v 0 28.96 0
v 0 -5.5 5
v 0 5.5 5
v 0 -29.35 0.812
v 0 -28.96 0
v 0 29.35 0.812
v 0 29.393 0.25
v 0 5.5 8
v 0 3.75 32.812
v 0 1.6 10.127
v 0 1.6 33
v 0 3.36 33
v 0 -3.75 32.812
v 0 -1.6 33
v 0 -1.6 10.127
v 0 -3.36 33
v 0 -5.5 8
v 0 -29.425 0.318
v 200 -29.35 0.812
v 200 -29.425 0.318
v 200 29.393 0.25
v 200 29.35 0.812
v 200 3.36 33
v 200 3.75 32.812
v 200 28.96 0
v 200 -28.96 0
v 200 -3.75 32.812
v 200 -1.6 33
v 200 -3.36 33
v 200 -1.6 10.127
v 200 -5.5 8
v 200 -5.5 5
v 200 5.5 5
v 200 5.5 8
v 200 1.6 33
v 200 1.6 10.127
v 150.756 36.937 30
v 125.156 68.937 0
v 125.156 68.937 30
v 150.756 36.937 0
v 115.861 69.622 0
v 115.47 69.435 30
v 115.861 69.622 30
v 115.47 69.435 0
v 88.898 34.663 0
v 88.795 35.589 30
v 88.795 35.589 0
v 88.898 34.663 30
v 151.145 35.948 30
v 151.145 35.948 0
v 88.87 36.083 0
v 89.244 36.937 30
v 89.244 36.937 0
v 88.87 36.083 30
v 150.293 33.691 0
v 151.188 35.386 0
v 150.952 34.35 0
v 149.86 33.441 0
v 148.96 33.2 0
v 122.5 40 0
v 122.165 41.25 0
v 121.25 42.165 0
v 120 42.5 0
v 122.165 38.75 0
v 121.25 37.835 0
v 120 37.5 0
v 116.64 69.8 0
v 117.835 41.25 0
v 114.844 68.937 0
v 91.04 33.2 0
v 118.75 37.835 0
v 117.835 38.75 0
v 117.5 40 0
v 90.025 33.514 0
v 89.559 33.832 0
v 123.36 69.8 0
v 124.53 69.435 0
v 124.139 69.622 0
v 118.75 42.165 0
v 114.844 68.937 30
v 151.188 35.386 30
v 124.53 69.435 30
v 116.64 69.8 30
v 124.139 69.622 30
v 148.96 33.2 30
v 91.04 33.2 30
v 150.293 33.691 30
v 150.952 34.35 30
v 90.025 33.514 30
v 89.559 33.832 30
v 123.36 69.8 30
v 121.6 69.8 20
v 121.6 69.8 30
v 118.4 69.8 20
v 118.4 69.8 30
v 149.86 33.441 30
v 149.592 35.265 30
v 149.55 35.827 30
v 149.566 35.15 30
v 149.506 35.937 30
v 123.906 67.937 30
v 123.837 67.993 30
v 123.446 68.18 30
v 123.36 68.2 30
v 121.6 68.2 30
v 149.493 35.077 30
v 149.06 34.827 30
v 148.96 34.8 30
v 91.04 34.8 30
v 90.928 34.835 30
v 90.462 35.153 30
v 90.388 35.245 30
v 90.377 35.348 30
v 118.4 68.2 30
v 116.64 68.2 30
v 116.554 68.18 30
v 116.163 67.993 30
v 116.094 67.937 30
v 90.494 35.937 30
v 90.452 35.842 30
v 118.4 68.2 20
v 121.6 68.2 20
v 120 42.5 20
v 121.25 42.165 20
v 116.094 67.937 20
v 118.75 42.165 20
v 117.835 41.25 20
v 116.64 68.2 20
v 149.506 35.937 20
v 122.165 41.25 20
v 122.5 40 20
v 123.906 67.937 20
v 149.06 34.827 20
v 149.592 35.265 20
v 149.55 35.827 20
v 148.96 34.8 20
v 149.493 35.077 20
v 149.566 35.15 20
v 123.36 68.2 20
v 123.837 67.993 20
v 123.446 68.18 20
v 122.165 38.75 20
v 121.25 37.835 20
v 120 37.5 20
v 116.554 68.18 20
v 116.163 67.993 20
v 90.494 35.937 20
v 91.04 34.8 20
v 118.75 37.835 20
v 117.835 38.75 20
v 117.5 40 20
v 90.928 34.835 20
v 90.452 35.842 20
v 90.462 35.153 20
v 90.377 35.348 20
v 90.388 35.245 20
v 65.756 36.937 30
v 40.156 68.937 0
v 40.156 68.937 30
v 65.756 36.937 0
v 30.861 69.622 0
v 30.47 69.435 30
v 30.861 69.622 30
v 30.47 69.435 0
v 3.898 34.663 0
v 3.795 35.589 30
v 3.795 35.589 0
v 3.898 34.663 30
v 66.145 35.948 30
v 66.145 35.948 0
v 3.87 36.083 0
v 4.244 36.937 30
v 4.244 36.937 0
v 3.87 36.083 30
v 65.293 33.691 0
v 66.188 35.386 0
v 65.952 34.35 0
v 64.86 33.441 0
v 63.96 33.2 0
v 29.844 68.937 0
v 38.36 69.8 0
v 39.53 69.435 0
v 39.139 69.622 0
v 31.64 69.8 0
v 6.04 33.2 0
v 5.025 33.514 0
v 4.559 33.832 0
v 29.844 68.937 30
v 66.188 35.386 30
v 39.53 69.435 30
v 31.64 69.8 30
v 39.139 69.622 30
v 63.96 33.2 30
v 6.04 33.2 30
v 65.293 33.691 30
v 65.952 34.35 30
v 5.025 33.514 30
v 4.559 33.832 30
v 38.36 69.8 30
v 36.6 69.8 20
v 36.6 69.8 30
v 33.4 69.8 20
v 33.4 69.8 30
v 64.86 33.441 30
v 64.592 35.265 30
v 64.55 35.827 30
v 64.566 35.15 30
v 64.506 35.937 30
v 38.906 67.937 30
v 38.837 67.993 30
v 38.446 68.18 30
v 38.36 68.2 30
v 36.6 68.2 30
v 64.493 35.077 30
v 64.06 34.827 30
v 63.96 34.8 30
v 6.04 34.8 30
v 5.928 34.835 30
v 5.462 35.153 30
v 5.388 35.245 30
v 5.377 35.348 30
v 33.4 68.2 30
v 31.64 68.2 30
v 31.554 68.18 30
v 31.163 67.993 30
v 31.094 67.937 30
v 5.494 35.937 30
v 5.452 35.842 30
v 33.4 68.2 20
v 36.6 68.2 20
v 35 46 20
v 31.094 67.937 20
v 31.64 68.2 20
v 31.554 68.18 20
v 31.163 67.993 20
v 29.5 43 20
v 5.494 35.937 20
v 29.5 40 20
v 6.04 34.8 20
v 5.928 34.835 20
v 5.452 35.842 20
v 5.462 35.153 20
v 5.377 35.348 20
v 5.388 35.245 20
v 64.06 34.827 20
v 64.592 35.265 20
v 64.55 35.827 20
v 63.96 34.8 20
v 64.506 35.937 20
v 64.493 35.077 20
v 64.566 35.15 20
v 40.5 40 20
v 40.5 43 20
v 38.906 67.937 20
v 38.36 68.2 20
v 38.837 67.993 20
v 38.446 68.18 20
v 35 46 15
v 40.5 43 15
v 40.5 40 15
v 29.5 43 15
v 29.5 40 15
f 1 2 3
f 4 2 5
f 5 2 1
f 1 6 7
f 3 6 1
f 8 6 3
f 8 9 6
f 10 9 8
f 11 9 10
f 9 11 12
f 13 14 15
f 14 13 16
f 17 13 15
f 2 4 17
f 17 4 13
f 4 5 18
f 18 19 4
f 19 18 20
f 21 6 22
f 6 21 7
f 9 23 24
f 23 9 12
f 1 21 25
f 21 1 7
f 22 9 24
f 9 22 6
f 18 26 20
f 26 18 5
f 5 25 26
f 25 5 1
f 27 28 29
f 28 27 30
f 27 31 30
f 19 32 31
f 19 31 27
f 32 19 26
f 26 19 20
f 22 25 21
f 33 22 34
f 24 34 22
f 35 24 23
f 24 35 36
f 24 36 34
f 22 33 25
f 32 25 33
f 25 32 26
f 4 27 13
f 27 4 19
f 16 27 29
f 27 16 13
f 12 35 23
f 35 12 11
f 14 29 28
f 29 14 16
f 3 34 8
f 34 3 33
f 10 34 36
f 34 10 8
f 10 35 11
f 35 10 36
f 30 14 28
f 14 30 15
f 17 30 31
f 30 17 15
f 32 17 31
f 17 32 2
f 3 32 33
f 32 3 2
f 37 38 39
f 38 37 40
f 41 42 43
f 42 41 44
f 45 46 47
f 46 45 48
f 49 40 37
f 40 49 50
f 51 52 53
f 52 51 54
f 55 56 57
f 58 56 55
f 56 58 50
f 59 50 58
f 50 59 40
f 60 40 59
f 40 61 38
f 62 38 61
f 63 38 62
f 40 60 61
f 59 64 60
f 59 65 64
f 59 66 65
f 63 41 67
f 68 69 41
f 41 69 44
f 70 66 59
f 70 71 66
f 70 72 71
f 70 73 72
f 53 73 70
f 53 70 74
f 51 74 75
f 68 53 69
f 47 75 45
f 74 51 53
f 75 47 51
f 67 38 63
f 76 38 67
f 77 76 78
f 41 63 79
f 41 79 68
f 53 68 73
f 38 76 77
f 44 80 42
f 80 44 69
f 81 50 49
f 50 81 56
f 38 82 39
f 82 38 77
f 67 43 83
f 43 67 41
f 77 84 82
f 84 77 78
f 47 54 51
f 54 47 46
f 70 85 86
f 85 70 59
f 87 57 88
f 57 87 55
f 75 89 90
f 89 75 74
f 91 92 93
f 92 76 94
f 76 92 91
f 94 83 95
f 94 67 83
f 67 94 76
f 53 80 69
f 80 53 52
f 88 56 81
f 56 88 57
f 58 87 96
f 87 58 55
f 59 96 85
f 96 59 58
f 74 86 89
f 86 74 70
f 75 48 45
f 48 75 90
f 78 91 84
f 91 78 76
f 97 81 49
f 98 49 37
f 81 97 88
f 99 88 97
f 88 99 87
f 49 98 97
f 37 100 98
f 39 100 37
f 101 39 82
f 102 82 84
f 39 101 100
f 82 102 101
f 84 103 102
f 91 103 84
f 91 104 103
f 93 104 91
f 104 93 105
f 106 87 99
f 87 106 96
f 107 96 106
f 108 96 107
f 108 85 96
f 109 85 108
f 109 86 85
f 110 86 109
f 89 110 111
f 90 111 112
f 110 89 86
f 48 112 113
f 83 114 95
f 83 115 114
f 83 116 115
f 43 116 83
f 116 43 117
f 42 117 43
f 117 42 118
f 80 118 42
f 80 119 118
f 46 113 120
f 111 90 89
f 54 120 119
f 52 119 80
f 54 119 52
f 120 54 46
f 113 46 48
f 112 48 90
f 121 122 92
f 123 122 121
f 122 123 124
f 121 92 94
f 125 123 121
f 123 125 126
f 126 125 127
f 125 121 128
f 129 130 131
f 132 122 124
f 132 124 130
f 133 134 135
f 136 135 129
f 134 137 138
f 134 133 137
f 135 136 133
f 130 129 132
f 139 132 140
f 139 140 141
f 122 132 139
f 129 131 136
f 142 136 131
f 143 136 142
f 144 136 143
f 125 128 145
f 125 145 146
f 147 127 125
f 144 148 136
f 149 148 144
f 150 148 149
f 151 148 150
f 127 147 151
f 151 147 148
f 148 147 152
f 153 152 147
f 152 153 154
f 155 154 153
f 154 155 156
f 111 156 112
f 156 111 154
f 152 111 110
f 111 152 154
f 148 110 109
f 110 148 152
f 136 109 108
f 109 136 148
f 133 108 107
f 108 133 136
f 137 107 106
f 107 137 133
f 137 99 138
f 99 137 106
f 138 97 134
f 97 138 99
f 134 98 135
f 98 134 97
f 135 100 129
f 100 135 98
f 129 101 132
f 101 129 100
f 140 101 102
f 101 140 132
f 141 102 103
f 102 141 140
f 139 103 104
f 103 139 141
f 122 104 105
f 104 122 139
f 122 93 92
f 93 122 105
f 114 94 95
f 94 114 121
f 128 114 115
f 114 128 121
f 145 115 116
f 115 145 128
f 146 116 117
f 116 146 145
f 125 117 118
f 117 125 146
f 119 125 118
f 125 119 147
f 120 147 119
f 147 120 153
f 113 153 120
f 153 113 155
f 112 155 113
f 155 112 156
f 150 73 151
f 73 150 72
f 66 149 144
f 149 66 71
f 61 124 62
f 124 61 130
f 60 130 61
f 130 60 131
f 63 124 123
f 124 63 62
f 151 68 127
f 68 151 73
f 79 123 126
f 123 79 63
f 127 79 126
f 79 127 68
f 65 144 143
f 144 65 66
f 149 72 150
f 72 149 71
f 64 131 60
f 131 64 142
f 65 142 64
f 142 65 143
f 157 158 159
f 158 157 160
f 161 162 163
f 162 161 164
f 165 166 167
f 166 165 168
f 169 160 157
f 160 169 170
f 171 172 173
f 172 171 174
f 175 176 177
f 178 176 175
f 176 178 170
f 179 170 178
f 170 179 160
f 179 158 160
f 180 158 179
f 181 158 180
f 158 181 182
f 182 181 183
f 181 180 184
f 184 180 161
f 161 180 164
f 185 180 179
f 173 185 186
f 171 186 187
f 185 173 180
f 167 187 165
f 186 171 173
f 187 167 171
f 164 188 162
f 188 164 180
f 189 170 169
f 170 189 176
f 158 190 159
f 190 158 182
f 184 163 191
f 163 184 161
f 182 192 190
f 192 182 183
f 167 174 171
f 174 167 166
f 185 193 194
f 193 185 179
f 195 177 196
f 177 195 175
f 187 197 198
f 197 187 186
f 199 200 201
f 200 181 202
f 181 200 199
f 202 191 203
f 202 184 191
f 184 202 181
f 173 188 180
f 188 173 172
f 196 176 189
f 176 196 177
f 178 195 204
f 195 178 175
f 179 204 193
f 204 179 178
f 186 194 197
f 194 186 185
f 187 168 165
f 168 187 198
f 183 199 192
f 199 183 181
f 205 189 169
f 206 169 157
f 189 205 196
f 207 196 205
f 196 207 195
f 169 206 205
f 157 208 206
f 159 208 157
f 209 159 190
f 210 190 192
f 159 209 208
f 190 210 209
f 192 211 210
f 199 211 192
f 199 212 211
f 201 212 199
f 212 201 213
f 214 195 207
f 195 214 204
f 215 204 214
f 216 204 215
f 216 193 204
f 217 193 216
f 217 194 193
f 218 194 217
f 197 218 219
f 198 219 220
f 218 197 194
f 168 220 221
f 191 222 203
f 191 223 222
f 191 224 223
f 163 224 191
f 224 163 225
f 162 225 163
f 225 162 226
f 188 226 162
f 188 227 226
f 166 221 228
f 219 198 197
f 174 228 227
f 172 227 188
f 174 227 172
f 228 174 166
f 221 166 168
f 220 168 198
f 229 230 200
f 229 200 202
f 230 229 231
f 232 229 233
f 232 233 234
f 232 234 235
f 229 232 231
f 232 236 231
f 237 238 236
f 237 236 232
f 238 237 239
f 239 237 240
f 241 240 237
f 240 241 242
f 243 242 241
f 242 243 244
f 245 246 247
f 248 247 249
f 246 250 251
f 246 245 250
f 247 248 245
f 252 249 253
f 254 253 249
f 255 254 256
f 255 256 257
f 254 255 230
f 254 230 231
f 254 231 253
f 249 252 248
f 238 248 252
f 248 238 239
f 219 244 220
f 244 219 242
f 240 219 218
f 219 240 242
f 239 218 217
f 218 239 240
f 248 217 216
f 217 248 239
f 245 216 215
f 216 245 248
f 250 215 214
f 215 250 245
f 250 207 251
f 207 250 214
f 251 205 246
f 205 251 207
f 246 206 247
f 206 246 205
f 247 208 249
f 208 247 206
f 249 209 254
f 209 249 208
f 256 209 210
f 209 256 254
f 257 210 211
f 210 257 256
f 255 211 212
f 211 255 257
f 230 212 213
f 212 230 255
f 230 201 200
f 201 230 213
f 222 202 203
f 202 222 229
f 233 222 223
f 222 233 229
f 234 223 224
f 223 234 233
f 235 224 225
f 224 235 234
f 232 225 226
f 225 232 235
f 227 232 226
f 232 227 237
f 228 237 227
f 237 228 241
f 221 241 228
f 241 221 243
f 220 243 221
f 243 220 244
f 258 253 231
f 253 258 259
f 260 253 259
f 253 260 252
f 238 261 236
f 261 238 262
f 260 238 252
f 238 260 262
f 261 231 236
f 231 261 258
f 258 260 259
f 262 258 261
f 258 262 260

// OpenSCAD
/*
 Generates LED backlighting bases for etched acrylic signs.
 v1.0 released in 2019 by Jeff Eaton (bonsai@angrylittletree.com)
 v1.1 released to fix Customizer bugs, add chamfering
 v1.2 Embarassing typo that broke Customizer again
*/


// Generate one part, multiple parts, or an assembled example
MODE = "set"; // ["base", "halfbase", "plugcap", "endcap", "set", "demo"]
// Rounded or angled base
BASE_SHAPE = "A"; // ["D", "A"]
// How are you supplying power to the LED strip?
CONNECTOR_STYLE = 1; //[1:"Soldered wire", 2:"Strip clip", 3:"Hollow with space for wiring", 4:"Micro-RF Remote"]

// Thickness of the acrylic sheet you're lighting
ACRYLIC_DEPTH = 3.2;
// Width of the acrylic sheet you're lighting
ACRYLIC_WIDTH = 200;
// How high the base should 'grip' the acrylic sheet for stability
SUPPORTED_HEIGHT = 25; // [10:5:50]
// How deep the base should be (deeper == more stable)
BASE_DEPTH = 60; // [20:5:100]
// Add a convenience slot in he base for a small remote control
BASE_REMOTE_HOLDER = false; // [true,false]
// Add a tray for business cards to the sign's base
BASE_CARD_TRAY = false; // [true,false]

// How far out from the sign should the base's endcaps protrude?
BASE_CAP_WIDTH = 20; // [10:5:60]
// How far should the sign's endcaps overlap the main base?
BASE_CAP_OVERLAP = 10; // [5:5:20]


/* [Hidden] */
LED_ELEVATION = 5;
LED_HEIGHT = 3;
LED_WIDTH = 11;
REMOTE_SIZE = [40,8,87];
CARD_TRAY_SIZE = [90,60];
CARD_TRAY_HEIGHT = 20;
BASE_HEIGHT = LED_ELEVATION + LED_HEIGHT + SUPPORTED_HEIGHT;

build(MODE);

module build(m=MODE) {
    if (m == "base") base();
    if (m == "halfbase") base(ACRYLIC_WIDTH/2);
    if (m == "endcap") endcap();
    if (m == "plugcap") plugcap();
    if (m == "set") {
        base();
        translate([BASE_DEPTH*2,BASE_DEPTH/2+5]) rotate([0,0,-90]) plugcap();
        translate([BASE_DEPTH/2+5,BASE_DEPTH/2+5]) rotate([0,0,-90]) endcap();
    }
    if (m == "demo") {
        base();
        translate([-BASE_CAP_OVERLAP*2,0,0])rotate([0,90,0]) endcap();
        translate([ACRYLIC_WIDTH + BASE_CAP_OVERLAP*2,0,0]) rotate([0,90,180]) plugcap();
        #cube([ACRYLIC_WIDTH, ACRYLIC_DEPTH, 200+SUPPORTED_HEIGHT]);
    }
}


module endcap() {
    difference() {
        cap_blank();
        translate([0,0,BASE_CAP_WIDTH-5]) linear_extrude(5.1) led_channel();
    }
}

module plugcap() {
    difference() {
        cap_blank();
        if (CONNECTOR_STYLE == 1) {
            // Hole for a soldered-on cord. Must be threaded through endcap before soldering.
            translate([-LED_ELEVATION,0,-.1]) linear_extrude(BASE_CAP_WIDTH+1) circle(r=2.5, $fn=12);
        }
        else if (CONNECTOR_STYLE == 2) {
            // Hole for a a 15x5mm solderless LED clip.
            translate([-LED_ELEVATION,0,-.1]) linear_extrude(BASE_CAP_WIDTH+1) square([5,15], center=true);
        }
        else if (CONNECTOR_STYLE == 3) {
            translate([0,0,2.4]) union() {
                linear_extrude(BASE_CAP_OVERLAP+BASE_CAP_WIDTH+1) offset(-2, $fn=12) base_profile();
                rotate([90,-90,0]) translate([15,4.5,15]) {
                    translate([0,-2.5,0]) cube([BASE_CAP_WIDTH+BASE_CAP_OVERLAP,5,20]);
                    cylinder(r=2.5, h=20, $fn=24);
                }
            }
        }
        else if (CONNECTOR_STYLE == 4) {
            // Hole for a a 15x5mm solderless LED clip.
            translate([-18,0,-.1]) linear_extrude(BASE_CAP_WIDTH+1) rotate([0,0,180]) scale([1.5,1.15]) led_channel();
        }

    }
}

module cap_blank() {
    difference() {
        linear_extrude(BASE_CAP_WIDTH+BASE_CAP_OVERLAP) offset(1.8, $fn=12) base_profile();
        translate([0,0,BASE_CAP_WIDTH]) linear_extrude(BASE_CAP_OVERLAP+1) union() {
            offset(.2, $fn=12) base_profile();
            acrylic_channel();
        }
    }
}

module base(length=ACRYLIC_WIDTH) {
    ROUNDING = (BASE_SHAPE == "A" ? 4 : 24);
    
    difference() {
        union() {
            rotate([0,90,0])linear_extrude(length) base_profile();
                if (BASE_CARD_TRAY) {
                    translate([ACRYLIC_WIDTH/2,-CARD_TRAY_SIZE[1]+BASE_DEPTH/3,0]) linear_extrude(LED_ELEVATION + CARD_TRAY_HEIGHT) offset(3.2, $fn=ROUNDING) square(CARD_TRAY_SIZE, center=true);
                }
        }

        union() {
            rotate([0,90,0]) {
                translate([0,0,-.5]) union() {
                    linear_extrude(length+1) union() {
                        led_channel();
                        acrylic_channel();
                    }
                }
                if (BASE_REMOTE_HOLDER) {
                    translate([-REMOTE_SIZE[0]/2 - LED_ELEVATION, 15, ACRYLIC_WIDTH/2]) cube(REMOTE_SIZE, center=true);
                }
            }
            if (BASE_CARD_TRAY) {
                translate([ACRYLIC_WIDTH/2,-CARD_TRAY_SIZE[1]+BASE_DEPTH/3,LED_ELEVATION]) linear_extrude(LED_ELEVATION + CARD_TRAY_HEIGHT*2) square(CARD_TRAY_SIZE, center=true);
            }
       }
    }

}

module base_profile() {
    if (BASE_SHAPE == "A") {
        offset(.5, $fn=6) offset(-.5)
        polygon(
            [[0,BASE_DEPTH/2],
            [-BASE_HEIGHT,ACRYLIC_DEPTH/2 + 2],
            [-BASE_HEIGHT,-ACRYLIC_DEPTH/2 - 2],
            [0,-BASE_DEPTH/2]]
        );
    }
    else if (BASE_SHAPE == "D") {
        intersection() {
            scale([BASE_HEIGHT*2, BASE_DEPTH]) circle(r=.5, center=true, $fn=72);
            translate([-BASE_HEIGHT/2,0]) square([BASE_HEIGHT,BASE_DEPTH], center=true);
        }
    }
}

module led_channel() {
    // Channel for the LED strip
    polygon(
        [[-LED_ELEVATION,-LED_WIDTH/2],
        [-LED_ELEVATION-LED_HEIGHT,-LED_WIDTH/2],
        [-LED_ELEVATION-LED_HEIGHT-3,0],
        [-LED_ELEVATION-LED_HEIGHT,LED_WIDTH/2],
        [-LED_ELEVATION,LED_WIDTH/2]]
    );
}


module acrylic_channel() {
    // Channel for theacrylic plate
    translate([-BASE_HEIGHT/2-LED_ELEVATION-LED_HEIGHT,0]) square([BASE_HEIGHT, ACRYLIC_DEPTH], center=true);
}
